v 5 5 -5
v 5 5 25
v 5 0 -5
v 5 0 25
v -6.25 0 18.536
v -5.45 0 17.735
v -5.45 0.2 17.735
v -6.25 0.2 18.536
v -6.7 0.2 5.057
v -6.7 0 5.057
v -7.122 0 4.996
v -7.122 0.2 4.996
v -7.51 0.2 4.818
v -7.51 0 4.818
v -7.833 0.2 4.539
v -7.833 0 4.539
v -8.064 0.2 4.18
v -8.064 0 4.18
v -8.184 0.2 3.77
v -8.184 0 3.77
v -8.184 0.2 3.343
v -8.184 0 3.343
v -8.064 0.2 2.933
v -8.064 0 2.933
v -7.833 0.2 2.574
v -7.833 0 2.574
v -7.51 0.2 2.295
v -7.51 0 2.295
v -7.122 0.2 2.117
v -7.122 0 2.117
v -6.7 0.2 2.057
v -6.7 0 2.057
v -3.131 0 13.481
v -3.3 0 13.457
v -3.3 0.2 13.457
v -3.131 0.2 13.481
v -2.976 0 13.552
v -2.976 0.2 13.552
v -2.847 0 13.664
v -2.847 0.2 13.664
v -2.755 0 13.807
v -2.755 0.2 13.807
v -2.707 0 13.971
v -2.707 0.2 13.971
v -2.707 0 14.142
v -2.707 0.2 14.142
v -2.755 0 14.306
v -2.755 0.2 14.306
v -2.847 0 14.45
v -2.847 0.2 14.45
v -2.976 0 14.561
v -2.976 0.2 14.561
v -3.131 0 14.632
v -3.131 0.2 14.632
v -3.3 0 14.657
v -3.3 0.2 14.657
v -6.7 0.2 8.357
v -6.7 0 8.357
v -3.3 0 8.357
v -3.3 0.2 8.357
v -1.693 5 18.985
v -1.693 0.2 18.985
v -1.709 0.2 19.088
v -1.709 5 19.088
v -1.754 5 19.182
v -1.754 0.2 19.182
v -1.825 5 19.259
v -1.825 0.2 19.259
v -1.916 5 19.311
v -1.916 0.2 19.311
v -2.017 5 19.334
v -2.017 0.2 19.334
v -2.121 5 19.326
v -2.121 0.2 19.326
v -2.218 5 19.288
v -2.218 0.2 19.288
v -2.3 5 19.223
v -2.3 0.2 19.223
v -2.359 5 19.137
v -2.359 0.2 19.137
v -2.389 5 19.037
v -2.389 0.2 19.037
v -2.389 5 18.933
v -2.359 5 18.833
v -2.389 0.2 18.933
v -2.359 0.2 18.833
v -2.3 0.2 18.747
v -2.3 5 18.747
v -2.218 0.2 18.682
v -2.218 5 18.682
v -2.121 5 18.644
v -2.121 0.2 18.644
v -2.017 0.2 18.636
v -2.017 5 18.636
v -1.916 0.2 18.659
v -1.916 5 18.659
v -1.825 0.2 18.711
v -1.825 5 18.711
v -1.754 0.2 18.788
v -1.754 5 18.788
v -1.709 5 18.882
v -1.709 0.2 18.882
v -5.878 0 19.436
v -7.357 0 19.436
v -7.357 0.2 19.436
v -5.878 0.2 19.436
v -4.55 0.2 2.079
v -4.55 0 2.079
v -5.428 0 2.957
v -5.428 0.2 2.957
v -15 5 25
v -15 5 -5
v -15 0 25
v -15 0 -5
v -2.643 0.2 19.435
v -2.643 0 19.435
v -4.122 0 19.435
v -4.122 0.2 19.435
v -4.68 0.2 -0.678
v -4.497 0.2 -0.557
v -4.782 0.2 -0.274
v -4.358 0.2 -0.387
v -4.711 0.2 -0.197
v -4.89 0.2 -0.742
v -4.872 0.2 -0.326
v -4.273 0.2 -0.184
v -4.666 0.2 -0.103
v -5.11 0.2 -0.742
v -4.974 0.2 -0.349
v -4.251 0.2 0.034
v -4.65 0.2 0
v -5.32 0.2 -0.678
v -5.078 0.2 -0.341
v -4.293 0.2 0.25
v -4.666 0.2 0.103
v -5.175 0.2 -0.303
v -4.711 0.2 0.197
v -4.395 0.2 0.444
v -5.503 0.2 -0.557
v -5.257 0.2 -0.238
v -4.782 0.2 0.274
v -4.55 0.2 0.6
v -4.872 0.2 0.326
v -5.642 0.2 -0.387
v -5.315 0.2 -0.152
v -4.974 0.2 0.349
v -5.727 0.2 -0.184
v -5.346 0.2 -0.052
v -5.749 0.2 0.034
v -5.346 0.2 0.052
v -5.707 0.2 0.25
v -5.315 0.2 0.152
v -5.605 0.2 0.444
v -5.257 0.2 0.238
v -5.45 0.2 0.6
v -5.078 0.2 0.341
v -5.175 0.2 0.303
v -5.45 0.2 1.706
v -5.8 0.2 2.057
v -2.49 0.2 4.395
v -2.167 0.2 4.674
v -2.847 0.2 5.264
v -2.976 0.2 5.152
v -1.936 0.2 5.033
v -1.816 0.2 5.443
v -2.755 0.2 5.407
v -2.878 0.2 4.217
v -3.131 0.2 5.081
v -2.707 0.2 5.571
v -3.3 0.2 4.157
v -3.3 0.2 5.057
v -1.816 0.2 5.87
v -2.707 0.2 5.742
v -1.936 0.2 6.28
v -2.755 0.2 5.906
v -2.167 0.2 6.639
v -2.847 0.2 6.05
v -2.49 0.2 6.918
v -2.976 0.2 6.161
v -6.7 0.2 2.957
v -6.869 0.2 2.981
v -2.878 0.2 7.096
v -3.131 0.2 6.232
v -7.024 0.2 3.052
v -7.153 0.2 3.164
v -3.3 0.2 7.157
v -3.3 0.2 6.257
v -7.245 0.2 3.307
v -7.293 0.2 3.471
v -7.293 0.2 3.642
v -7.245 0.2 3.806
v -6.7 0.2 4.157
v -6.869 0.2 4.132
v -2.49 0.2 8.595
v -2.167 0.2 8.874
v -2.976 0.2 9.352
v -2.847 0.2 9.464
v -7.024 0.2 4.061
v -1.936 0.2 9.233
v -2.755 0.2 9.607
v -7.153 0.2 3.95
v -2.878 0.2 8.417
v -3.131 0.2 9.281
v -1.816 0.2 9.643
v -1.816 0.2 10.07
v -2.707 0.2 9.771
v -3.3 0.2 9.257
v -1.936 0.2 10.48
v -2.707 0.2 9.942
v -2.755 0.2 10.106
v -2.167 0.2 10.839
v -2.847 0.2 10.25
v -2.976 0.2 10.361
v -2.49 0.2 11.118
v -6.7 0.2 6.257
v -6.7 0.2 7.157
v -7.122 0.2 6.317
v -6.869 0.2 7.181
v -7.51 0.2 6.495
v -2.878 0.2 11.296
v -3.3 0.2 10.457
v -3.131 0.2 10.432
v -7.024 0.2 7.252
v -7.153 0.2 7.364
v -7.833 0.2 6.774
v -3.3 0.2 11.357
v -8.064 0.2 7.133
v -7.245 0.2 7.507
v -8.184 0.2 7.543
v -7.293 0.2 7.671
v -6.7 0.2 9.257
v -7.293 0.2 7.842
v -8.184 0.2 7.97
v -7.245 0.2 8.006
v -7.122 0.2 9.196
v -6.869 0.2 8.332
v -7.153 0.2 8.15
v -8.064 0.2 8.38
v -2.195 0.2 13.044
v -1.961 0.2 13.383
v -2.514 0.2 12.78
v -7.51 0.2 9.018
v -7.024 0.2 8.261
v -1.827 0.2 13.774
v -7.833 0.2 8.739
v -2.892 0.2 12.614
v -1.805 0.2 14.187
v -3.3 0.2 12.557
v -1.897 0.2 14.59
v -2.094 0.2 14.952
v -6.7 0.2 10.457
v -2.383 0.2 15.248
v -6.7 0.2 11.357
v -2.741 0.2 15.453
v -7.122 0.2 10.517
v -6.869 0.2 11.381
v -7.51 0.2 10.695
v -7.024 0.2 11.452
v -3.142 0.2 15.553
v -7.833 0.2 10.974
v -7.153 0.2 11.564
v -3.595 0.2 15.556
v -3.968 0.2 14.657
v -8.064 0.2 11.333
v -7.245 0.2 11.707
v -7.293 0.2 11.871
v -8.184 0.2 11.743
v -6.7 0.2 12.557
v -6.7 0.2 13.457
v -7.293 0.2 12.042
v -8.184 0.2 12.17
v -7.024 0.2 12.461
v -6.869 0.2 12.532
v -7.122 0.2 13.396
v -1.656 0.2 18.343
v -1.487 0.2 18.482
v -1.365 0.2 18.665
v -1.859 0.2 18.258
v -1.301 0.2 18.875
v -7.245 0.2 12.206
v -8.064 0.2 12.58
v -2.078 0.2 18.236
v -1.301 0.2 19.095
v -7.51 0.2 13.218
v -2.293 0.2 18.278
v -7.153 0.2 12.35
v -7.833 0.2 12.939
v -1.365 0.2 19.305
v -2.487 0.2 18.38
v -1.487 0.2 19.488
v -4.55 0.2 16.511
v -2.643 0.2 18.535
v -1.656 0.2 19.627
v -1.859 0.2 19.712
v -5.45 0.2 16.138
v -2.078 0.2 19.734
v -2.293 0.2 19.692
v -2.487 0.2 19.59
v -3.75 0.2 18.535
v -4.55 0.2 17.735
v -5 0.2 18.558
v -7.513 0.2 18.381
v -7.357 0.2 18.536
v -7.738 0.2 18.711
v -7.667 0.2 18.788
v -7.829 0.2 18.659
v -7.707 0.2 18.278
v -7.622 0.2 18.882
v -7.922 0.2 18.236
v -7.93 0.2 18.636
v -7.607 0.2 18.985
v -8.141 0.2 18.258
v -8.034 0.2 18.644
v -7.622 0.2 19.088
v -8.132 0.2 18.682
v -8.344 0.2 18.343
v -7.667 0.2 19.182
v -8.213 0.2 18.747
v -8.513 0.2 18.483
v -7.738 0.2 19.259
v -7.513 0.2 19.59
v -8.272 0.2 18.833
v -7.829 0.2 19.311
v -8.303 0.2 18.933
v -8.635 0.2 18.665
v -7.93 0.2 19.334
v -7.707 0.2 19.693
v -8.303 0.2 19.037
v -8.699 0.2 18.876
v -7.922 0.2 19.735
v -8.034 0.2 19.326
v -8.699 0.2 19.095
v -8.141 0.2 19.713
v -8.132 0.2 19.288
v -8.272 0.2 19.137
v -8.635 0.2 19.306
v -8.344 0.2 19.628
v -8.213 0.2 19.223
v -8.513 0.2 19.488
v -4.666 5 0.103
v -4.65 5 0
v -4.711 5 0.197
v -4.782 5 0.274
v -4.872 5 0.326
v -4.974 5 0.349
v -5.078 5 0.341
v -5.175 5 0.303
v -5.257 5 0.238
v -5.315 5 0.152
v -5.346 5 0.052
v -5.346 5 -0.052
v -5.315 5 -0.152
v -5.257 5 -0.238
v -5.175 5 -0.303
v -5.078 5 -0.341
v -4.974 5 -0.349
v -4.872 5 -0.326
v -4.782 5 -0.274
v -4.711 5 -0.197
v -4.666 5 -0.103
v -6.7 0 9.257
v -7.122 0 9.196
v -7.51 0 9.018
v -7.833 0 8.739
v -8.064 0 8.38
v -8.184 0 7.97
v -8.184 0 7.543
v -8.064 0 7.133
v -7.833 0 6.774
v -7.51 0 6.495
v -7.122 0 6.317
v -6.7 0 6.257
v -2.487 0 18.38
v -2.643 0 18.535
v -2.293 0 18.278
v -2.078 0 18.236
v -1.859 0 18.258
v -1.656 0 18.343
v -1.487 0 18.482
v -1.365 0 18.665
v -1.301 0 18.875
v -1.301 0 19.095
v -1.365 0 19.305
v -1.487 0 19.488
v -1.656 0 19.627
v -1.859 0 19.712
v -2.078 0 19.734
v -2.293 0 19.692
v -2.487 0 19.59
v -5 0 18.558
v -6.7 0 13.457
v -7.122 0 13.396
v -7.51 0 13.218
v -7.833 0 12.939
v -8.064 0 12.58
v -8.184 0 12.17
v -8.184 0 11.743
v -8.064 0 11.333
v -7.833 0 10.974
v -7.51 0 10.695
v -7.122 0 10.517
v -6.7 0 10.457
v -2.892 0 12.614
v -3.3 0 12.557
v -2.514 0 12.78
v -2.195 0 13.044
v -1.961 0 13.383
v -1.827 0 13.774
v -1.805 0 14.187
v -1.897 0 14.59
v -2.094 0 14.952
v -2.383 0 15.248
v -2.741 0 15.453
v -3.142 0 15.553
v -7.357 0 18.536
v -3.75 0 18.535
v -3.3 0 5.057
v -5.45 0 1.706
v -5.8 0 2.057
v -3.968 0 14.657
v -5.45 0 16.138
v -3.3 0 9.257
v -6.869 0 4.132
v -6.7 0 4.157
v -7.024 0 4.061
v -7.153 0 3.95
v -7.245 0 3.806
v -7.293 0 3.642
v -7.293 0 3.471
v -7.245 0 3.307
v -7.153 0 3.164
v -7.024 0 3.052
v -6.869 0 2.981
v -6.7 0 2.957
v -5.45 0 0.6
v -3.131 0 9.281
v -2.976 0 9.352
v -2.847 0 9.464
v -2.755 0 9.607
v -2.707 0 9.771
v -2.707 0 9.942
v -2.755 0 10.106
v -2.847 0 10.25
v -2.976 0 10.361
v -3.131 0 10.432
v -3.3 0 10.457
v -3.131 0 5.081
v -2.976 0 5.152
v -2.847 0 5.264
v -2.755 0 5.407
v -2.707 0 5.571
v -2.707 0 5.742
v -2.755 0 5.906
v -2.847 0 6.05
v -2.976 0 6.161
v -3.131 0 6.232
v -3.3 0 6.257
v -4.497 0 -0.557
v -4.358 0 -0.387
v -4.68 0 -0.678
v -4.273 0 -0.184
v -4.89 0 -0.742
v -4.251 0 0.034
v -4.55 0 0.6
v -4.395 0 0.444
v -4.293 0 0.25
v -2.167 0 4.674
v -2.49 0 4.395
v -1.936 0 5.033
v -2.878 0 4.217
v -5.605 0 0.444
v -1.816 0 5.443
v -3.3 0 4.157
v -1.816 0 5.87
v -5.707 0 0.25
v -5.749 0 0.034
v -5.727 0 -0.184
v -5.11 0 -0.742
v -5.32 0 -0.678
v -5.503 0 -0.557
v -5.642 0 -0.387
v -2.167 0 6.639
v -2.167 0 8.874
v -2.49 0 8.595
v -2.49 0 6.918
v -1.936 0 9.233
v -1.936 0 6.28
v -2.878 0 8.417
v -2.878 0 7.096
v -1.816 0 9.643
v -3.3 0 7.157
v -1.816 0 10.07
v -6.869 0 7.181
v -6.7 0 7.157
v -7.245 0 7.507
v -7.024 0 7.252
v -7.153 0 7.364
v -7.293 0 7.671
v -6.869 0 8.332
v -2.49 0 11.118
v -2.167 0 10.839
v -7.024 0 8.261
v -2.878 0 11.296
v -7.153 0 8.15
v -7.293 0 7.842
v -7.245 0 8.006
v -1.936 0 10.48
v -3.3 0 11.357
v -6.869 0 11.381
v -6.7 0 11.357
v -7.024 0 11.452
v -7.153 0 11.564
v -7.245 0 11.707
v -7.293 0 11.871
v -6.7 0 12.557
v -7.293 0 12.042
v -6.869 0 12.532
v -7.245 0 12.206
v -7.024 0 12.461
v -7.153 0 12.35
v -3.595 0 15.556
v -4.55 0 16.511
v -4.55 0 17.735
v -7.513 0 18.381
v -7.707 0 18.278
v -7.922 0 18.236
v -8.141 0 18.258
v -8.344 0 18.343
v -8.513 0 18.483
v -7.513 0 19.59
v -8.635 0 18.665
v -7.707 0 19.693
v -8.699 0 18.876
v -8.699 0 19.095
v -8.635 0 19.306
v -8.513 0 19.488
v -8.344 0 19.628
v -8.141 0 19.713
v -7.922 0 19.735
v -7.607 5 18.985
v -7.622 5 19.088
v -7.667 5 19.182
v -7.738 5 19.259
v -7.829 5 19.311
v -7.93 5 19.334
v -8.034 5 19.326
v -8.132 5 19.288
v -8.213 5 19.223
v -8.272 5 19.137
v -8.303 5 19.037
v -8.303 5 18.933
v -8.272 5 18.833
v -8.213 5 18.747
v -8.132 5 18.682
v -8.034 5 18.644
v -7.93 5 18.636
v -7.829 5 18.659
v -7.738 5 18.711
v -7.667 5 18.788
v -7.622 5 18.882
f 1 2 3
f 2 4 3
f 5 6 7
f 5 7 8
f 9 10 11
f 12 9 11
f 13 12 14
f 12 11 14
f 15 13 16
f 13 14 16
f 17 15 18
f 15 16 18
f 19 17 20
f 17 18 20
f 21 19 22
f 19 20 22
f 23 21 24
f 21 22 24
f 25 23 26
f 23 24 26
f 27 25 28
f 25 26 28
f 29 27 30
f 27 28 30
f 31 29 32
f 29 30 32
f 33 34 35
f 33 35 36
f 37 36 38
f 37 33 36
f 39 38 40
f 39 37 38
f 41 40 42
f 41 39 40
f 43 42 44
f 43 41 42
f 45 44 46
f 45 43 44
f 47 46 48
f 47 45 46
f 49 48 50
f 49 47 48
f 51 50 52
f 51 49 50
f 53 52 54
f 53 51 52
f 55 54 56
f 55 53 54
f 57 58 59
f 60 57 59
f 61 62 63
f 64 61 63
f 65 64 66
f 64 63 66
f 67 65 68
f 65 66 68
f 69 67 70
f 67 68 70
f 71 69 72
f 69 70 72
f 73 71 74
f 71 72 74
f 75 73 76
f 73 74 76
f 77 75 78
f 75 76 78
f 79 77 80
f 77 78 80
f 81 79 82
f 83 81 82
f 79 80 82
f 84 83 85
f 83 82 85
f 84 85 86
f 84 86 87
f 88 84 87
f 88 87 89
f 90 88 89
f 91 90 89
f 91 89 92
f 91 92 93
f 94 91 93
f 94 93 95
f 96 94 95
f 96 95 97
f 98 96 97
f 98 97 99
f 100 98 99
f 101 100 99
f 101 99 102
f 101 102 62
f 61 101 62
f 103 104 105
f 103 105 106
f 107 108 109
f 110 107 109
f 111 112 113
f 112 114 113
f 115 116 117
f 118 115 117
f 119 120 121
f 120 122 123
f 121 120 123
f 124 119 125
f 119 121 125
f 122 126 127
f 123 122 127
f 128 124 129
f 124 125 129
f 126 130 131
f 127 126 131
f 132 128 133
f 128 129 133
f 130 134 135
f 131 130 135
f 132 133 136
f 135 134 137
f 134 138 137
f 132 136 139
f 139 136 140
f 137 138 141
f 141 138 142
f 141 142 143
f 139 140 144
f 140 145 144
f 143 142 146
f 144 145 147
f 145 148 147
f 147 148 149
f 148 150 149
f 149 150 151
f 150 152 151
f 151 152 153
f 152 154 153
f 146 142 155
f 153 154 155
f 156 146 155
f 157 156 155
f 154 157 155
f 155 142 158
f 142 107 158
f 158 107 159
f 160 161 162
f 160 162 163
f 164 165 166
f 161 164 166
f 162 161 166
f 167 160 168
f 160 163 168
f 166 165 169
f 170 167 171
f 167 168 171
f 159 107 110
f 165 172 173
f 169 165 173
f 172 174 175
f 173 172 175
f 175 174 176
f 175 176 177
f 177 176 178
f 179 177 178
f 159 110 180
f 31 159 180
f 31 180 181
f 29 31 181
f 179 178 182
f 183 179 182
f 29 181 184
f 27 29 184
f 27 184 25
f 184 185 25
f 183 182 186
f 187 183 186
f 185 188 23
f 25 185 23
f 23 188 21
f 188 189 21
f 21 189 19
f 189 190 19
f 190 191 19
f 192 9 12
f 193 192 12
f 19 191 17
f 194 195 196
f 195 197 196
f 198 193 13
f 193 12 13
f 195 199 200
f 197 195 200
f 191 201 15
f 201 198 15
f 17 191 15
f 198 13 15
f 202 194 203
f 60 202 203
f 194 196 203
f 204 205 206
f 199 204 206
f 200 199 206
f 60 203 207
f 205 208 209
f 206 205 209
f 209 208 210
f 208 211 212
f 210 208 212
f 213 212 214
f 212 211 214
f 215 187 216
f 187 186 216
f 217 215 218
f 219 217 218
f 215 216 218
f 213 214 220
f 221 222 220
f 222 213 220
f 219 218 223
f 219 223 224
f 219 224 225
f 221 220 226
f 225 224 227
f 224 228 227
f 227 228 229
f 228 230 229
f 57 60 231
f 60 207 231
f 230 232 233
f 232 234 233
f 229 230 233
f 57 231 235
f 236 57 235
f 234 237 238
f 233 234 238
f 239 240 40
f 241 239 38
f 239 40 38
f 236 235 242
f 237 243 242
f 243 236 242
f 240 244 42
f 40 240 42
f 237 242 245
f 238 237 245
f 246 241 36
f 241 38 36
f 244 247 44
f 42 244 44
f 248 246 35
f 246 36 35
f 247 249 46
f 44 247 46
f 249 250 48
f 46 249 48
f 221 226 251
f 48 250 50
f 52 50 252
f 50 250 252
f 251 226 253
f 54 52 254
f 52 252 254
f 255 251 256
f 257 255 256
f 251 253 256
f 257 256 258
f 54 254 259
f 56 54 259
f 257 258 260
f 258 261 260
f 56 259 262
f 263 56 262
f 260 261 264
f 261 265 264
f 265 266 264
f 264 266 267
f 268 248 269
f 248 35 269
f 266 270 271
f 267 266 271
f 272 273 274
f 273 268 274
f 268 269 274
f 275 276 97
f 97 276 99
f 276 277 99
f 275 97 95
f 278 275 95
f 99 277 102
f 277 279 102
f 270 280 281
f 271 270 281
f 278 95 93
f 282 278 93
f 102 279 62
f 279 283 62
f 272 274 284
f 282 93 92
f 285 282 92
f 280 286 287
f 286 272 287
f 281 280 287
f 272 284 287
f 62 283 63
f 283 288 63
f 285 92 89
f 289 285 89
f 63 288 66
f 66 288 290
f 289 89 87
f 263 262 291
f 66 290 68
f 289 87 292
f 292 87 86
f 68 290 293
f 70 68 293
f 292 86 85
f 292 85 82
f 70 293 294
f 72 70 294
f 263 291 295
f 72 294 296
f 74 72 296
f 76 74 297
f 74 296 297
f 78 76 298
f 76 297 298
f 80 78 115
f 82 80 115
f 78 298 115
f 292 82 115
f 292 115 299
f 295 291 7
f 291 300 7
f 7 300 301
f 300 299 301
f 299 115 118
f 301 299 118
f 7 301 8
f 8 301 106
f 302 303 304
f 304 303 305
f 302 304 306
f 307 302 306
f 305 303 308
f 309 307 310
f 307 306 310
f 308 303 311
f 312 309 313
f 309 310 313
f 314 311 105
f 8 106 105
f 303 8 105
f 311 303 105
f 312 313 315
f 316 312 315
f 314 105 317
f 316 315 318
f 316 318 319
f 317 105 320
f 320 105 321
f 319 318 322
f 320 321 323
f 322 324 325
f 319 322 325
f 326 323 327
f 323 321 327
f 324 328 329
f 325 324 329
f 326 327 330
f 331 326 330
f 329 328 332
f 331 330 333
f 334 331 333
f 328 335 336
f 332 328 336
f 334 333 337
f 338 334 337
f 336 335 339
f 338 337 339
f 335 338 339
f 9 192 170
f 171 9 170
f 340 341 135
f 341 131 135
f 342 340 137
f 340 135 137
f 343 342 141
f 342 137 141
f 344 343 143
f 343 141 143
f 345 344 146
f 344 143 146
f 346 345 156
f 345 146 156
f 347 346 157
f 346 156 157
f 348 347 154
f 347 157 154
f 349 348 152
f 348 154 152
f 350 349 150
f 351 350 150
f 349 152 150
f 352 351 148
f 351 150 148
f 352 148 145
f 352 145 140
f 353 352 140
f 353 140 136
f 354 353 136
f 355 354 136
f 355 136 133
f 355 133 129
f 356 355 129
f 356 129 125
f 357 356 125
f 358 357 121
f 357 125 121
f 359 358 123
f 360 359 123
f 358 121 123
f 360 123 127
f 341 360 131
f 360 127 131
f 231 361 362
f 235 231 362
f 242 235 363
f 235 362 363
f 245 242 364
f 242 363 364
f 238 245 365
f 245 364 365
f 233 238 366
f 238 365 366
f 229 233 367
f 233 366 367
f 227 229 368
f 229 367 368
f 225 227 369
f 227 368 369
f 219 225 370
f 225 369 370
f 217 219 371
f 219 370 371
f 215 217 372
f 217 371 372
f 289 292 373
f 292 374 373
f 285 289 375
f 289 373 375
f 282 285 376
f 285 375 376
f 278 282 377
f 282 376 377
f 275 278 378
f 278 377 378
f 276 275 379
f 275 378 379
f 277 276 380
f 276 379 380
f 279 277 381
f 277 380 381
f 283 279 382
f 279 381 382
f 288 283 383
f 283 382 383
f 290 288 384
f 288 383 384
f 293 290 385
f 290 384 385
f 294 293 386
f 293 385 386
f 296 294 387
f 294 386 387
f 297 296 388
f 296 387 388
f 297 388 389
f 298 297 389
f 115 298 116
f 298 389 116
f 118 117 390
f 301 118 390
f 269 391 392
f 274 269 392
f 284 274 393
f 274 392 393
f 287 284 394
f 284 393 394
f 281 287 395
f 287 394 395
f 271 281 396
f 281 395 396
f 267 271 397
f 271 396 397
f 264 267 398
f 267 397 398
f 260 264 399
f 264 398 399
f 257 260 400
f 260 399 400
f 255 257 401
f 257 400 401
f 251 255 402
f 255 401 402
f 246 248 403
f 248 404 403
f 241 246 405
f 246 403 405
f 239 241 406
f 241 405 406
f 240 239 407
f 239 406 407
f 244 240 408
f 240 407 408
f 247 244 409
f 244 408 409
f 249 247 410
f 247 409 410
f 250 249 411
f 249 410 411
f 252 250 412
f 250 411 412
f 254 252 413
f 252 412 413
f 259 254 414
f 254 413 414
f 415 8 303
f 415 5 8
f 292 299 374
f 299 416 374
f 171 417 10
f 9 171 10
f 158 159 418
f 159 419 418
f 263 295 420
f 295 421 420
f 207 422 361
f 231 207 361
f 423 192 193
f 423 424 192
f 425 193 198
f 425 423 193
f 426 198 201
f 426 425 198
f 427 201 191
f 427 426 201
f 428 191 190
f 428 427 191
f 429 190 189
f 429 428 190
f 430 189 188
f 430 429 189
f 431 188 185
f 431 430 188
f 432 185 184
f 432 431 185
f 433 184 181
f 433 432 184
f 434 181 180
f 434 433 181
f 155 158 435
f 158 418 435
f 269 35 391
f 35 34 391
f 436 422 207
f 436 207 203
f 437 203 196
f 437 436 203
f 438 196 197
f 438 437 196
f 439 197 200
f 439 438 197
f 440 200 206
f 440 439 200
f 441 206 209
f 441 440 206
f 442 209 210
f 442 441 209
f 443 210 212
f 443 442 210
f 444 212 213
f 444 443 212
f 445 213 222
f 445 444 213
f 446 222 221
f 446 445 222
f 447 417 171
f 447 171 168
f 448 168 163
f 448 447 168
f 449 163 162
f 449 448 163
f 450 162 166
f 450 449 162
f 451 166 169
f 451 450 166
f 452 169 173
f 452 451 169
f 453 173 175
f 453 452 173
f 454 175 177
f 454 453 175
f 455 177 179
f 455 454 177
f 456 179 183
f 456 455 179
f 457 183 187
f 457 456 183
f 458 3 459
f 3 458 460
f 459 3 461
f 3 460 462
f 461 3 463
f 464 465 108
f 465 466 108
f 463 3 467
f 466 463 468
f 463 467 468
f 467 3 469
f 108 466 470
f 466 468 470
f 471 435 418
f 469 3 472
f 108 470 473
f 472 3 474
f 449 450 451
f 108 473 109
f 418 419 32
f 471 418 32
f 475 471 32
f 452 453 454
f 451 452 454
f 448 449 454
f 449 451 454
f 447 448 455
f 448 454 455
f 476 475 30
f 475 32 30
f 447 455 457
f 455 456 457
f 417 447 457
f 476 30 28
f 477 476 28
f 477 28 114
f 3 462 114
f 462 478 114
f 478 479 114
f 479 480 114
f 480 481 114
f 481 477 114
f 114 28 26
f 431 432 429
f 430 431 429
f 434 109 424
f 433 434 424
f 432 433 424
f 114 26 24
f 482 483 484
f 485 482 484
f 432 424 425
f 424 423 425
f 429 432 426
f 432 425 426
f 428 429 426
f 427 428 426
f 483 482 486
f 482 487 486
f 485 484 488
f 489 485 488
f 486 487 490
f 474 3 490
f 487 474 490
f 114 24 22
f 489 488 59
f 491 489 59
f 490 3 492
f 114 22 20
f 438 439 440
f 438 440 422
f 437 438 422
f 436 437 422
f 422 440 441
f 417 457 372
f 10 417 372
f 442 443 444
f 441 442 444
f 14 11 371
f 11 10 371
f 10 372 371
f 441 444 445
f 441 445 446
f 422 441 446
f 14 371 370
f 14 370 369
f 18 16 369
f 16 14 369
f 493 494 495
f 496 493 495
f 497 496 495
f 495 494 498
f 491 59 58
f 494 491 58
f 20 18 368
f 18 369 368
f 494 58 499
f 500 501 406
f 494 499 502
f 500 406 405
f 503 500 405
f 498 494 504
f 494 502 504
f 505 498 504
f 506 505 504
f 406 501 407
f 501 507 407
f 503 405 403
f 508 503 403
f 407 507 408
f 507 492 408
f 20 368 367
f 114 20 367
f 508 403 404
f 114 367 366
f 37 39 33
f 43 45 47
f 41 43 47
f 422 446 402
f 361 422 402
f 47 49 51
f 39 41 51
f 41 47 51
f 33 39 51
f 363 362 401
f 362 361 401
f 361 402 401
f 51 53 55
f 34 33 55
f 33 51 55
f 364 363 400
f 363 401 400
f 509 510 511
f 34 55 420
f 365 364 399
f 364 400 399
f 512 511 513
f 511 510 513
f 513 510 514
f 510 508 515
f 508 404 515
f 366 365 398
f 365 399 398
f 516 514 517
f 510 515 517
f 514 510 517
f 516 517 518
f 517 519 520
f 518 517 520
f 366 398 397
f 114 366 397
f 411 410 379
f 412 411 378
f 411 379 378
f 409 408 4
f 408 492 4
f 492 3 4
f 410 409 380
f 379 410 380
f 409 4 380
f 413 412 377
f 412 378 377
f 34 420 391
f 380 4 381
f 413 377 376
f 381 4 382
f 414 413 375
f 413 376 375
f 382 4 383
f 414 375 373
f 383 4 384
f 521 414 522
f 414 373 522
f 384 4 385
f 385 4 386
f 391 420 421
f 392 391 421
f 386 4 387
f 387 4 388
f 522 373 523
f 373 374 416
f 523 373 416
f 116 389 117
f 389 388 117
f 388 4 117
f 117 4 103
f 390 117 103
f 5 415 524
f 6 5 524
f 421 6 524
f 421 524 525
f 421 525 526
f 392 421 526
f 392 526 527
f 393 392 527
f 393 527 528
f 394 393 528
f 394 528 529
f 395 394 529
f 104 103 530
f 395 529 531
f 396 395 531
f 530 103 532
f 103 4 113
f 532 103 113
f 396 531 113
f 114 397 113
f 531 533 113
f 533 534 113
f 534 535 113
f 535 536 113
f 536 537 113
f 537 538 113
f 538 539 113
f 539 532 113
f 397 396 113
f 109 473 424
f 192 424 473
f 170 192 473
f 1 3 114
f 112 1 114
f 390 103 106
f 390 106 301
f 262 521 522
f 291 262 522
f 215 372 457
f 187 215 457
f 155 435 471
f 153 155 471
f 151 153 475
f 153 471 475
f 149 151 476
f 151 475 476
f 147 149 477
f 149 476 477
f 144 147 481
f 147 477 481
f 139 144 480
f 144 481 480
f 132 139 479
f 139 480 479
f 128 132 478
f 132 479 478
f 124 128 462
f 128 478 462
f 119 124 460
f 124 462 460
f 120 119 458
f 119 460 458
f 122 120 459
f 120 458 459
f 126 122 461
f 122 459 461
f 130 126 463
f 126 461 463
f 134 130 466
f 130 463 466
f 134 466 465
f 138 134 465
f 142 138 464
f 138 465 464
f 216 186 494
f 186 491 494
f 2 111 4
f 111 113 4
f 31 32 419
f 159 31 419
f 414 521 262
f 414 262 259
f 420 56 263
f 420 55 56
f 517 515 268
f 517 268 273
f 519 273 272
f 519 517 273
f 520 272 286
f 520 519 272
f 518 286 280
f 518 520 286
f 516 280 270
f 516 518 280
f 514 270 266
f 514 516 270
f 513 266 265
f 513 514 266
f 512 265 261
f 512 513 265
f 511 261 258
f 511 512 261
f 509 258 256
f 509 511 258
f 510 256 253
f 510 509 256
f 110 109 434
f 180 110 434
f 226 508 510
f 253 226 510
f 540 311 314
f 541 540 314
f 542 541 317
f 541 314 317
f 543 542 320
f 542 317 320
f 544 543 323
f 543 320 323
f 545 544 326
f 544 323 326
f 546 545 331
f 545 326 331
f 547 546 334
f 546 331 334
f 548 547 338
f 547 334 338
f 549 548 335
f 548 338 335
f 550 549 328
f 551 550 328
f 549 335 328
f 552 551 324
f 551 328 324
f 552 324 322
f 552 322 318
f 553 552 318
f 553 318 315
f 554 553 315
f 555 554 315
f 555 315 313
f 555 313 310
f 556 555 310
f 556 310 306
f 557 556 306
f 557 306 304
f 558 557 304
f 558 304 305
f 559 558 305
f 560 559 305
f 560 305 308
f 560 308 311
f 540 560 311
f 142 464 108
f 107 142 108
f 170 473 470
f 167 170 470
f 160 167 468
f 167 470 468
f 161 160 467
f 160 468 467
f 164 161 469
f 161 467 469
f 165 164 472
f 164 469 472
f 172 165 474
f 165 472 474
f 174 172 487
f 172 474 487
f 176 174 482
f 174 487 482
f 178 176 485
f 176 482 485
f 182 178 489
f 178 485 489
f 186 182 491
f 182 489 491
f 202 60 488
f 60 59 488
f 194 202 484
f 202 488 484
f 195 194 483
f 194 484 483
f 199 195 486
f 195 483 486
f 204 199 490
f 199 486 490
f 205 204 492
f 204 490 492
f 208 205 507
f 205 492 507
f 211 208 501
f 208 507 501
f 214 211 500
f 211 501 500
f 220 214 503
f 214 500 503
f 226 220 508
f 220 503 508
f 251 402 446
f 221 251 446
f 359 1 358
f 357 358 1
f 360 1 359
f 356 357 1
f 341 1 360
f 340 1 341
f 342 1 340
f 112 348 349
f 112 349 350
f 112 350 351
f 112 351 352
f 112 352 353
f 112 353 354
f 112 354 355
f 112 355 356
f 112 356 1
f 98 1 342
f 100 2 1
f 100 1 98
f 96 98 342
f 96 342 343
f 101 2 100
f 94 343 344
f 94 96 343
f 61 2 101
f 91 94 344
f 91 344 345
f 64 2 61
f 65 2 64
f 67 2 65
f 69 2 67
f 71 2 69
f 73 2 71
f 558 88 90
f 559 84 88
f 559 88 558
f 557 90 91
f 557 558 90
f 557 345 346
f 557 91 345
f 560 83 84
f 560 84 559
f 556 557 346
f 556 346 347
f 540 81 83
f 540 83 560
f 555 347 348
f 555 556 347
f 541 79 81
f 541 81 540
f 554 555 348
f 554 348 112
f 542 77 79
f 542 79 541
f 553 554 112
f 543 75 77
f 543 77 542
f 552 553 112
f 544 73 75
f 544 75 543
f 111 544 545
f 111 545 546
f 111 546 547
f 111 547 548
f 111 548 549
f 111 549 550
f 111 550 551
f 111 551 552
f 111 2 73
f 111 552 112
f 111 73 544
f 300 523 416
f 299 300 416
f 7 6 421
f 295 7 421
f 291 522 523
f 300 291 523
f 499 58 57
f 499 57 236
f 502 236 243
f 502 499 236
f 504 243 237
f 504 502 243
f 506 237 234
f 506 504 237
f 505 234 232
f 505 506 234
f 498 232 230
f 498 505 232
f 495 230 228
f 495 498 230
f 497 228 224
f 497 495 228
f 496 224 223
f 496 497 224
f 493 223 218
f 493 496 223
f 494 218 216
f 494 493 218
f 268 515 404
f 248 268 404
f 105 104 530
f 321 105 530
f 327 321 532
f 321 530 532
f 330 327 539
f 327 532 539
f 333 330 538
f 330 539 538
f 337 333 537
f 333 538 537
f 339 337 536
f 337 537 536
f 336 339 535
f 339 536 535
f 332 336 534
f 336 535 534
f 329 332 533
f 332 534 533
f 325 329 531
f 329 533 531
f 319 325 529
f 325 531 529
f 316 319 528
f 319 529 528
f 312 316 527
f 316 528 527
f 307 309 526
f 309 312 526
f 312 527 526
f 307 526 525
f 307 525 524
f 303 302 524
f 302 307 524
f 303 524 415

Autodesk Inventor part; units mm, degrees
ref_plane "YZ Plane" through (0, 0, 0) normal (1, 0, 0) x (0, 1, 0)
ref_plane "XZ Plane" through (0, 0, 0) normal (0, 1, 0) x (-1, 0, 0)
ref_plane "XY Plane" through (0, 0, 0) normal (0, 0, 1) x (1, 0, 0)
sketch "Boceto1" plane through (0, 0, 0) normal (0, 1, 0) x (-1, 0, 0)
  line L0 (3.5954, 15.5561) -> (3.1417, 15.5533)
  line L1 (3.3005, 14.6566) -> (3.9682, 14.6566)
  line L2 (5.45, 1.7061) -> (5.45, 0.6)
  line L3 (3.5954, 15.5561) -> (4.55, 16.5107)
  line L4 (4.55, 16.5107) -> (4.55, 17.7346)
  line L5 (5.45, 17.735) -> (5.45, 16.1384)
  line L6 (5.45, 16.1384) -> (3.9682, 14.6566)
  line L7 (6.6995, 10.4566) -> (3.3005, 10.4566)
  line L8 (3.3005, 11.3566) -> (6.6995, 11.3566)
  arc A0 (6.6995, 11.3566) -> (6.6995, 12.5566) centre (6.6995, 11.9566) ccw
  arc A1 (6.6995, 10.4566) -> (6.6995, 13.4566) centre (6.6995, 11.9566) ccw
  line L9 (6.6995, 12.5566) -> (3.3005, 12.5566)
  arc A2 (3.3005, 14.6566) -> (3.3005, 13.4566) centre (3.3005, 14.0566) ccw
  arc A3 (3.1417, 15.5533) -> (3.3005, 12.5566) centre (3.3026, 14.0593) ccw
  line L10 (3.3005, 13.4566) -> (6.6995, 13.4566)
  line L11 (3.3005, 9.2566) -> (6.6995, 9.2566)
  arc A4 (3.3005, 10.4566) -> (3.3005, 9.2566) centre (3.3005, 9.8566) ccw
  arc A5 (3.3005, 11.3566) -> (3.3005, 8.3566) centre (3.3005, 9.8566) ccw
  line L12 (6.6995, 8.3566) -> (3.3005, 8.3566)
  arc A6 (6.6995, 7.1566) -> (6.6995, 8.3566) centre (6.6995, 7.7566) ccw
  arc A7 (6.6995, 6.2566) -> (6.6995, 9.2566) centre (6.6995, 7.7566) ccw
  line L13 (3.3005, 7.1566) -> (6.6995, 7.1566)
  line L14 (6.6995, 6.2566) -> (3.3005, 6.2566)
  arc A8 (3.3005, 6.2566) -> (3.3005, 5.0566) centre (3.3005, 5.6566) ccw
  arc A9 (3.3005, 7.1566) -> (3.3005, 4.1566) centre (3.3005, 5.6566) ccw
  line L15 (3.3005, 5.0566) -> (6.6995, 5.0566)
  line L16 (6.6995, 4.1566) -> (3.3005, 4.1566)
  arc A10 (6.6995, 2.9566) -> (6.6995, 4.1566) centre (6.6995, 3.5566) ccw
  arc A11 (6.6995, 2.0566) -> (6.6995, 5.0566) centre (6.6995, 3.5566) ccw
  line L17 (4.55, 2.0789) -> (5.4276, 2.9566)
  line L18 (6.6995, 2.0566) -> (5.8004, 2.0566)
  line L19 (5.8004, 2.0566) -> (5.45, 1.7061)
  line L20 (4.55, 0.6) -> (4.55, 2.0789)
  arc A12 (4.55, 0.6) -> (5.45, 0.6) centre (5, 0) ccw
  line L21 (5.4276, 2.9566) -> (6.6995, 2.9566)
  line L22 (15, -5) -> (15, 25)
  line L23 (15, 25) -> (-5, 25)
  line L24 (-5, 25) -> (-5, -5)
  line L25 (-5, -5) -> (15, -5)
  line L26 (3.7496, 18.535) -> (2.6434, 18.535)
  line L27 (4.1224, 19.435) -> (4.9998, 18.5576)
  line L28 (4.55, 17.7346) -> (3.7496, 18.535)
  line L29 (2.6434, 19.435) -> (4.1224, 19.435)
  arc A13 (2.6434, 19.435) -> (2.6434, 18.535) centre (2.0434, 18.985) ccw
  line L30 (6.2504, 18.5355) -> (7.3566, 18.5355)
  line L31 (7.3566, 19.4355) -> (5.8776, 19.4355)
  arc A14 (7.3566, 18.5355) -> (7.3566, 19.4355) centre (7.9566, 18.9855) ccw
  line L32 (5.45, 17.735) -> (6.2504, 18.5355)
  line L33 (5.8776, 19.4355) -> (4.9998, 18.5576)
extrude "Extrusión1" add sketch "Boceto1" along normal blind 5 contours L3 L4 L28 L26 A13 L29 L27 L33 L31 A14 L30 L32 L5 L6 L1 A2 L10 A1 L7 A4 L11 A7 L14 A8 L15 A11 L18 L19 L2 A12 L20 L17 L21 A10 L16 A9 L13 A6 L12 A5 L8 A0 L9 A3 L0 | L25 L24 L23 L22
extrude "Extrusión2" cut sketch "Boceto1" along normal blind 0.2 contours L3 L4 L28 L26 A13 L29 L27 L33 L31 A14 L30 L32 L5 L6 L1 A2 L10 A1 L7 A4 L11 A7 L14 A8 L15 A11 L18 L19 L2 A12 L20 L17 L21 A10 L16 A9 L13 A6 L12 A5 L8 A0 L9 A3 L0
sketch "Boceto3" plane through (0, 0.2, 0) normal (0, -1, 0) x (1, 0, 0)
  arc A0 (-2.6434, 18.535) -> (-2.6434, 19.435) centre (-2.0434, 18.985) ccw projected
  arc A1 (-7.3566, 19.4355) -> (-7.3566, 18.5355) centre (-7.9566, 18.9855) ccw projected
  arc A2 (-5.45, 0.6) -> (-4.55, 0.6) centre (-5, 0) ccw projected
  circle A3 centre (-2.0434, 18.985) radius 0.35
  circle A4 centre (-7.9566, 18.985) radius 0.35
  circle A5 centre (-5, 0) radius 0.35
  point P0 (0, 0)
  dimension "d5" = 0.7
  dimension "d6" = 0.7
  dimension "d7" = 0.7
extrude "Extrusión3" cut sketch "Boceto3" against normal through all
properties part number "Mixer"
